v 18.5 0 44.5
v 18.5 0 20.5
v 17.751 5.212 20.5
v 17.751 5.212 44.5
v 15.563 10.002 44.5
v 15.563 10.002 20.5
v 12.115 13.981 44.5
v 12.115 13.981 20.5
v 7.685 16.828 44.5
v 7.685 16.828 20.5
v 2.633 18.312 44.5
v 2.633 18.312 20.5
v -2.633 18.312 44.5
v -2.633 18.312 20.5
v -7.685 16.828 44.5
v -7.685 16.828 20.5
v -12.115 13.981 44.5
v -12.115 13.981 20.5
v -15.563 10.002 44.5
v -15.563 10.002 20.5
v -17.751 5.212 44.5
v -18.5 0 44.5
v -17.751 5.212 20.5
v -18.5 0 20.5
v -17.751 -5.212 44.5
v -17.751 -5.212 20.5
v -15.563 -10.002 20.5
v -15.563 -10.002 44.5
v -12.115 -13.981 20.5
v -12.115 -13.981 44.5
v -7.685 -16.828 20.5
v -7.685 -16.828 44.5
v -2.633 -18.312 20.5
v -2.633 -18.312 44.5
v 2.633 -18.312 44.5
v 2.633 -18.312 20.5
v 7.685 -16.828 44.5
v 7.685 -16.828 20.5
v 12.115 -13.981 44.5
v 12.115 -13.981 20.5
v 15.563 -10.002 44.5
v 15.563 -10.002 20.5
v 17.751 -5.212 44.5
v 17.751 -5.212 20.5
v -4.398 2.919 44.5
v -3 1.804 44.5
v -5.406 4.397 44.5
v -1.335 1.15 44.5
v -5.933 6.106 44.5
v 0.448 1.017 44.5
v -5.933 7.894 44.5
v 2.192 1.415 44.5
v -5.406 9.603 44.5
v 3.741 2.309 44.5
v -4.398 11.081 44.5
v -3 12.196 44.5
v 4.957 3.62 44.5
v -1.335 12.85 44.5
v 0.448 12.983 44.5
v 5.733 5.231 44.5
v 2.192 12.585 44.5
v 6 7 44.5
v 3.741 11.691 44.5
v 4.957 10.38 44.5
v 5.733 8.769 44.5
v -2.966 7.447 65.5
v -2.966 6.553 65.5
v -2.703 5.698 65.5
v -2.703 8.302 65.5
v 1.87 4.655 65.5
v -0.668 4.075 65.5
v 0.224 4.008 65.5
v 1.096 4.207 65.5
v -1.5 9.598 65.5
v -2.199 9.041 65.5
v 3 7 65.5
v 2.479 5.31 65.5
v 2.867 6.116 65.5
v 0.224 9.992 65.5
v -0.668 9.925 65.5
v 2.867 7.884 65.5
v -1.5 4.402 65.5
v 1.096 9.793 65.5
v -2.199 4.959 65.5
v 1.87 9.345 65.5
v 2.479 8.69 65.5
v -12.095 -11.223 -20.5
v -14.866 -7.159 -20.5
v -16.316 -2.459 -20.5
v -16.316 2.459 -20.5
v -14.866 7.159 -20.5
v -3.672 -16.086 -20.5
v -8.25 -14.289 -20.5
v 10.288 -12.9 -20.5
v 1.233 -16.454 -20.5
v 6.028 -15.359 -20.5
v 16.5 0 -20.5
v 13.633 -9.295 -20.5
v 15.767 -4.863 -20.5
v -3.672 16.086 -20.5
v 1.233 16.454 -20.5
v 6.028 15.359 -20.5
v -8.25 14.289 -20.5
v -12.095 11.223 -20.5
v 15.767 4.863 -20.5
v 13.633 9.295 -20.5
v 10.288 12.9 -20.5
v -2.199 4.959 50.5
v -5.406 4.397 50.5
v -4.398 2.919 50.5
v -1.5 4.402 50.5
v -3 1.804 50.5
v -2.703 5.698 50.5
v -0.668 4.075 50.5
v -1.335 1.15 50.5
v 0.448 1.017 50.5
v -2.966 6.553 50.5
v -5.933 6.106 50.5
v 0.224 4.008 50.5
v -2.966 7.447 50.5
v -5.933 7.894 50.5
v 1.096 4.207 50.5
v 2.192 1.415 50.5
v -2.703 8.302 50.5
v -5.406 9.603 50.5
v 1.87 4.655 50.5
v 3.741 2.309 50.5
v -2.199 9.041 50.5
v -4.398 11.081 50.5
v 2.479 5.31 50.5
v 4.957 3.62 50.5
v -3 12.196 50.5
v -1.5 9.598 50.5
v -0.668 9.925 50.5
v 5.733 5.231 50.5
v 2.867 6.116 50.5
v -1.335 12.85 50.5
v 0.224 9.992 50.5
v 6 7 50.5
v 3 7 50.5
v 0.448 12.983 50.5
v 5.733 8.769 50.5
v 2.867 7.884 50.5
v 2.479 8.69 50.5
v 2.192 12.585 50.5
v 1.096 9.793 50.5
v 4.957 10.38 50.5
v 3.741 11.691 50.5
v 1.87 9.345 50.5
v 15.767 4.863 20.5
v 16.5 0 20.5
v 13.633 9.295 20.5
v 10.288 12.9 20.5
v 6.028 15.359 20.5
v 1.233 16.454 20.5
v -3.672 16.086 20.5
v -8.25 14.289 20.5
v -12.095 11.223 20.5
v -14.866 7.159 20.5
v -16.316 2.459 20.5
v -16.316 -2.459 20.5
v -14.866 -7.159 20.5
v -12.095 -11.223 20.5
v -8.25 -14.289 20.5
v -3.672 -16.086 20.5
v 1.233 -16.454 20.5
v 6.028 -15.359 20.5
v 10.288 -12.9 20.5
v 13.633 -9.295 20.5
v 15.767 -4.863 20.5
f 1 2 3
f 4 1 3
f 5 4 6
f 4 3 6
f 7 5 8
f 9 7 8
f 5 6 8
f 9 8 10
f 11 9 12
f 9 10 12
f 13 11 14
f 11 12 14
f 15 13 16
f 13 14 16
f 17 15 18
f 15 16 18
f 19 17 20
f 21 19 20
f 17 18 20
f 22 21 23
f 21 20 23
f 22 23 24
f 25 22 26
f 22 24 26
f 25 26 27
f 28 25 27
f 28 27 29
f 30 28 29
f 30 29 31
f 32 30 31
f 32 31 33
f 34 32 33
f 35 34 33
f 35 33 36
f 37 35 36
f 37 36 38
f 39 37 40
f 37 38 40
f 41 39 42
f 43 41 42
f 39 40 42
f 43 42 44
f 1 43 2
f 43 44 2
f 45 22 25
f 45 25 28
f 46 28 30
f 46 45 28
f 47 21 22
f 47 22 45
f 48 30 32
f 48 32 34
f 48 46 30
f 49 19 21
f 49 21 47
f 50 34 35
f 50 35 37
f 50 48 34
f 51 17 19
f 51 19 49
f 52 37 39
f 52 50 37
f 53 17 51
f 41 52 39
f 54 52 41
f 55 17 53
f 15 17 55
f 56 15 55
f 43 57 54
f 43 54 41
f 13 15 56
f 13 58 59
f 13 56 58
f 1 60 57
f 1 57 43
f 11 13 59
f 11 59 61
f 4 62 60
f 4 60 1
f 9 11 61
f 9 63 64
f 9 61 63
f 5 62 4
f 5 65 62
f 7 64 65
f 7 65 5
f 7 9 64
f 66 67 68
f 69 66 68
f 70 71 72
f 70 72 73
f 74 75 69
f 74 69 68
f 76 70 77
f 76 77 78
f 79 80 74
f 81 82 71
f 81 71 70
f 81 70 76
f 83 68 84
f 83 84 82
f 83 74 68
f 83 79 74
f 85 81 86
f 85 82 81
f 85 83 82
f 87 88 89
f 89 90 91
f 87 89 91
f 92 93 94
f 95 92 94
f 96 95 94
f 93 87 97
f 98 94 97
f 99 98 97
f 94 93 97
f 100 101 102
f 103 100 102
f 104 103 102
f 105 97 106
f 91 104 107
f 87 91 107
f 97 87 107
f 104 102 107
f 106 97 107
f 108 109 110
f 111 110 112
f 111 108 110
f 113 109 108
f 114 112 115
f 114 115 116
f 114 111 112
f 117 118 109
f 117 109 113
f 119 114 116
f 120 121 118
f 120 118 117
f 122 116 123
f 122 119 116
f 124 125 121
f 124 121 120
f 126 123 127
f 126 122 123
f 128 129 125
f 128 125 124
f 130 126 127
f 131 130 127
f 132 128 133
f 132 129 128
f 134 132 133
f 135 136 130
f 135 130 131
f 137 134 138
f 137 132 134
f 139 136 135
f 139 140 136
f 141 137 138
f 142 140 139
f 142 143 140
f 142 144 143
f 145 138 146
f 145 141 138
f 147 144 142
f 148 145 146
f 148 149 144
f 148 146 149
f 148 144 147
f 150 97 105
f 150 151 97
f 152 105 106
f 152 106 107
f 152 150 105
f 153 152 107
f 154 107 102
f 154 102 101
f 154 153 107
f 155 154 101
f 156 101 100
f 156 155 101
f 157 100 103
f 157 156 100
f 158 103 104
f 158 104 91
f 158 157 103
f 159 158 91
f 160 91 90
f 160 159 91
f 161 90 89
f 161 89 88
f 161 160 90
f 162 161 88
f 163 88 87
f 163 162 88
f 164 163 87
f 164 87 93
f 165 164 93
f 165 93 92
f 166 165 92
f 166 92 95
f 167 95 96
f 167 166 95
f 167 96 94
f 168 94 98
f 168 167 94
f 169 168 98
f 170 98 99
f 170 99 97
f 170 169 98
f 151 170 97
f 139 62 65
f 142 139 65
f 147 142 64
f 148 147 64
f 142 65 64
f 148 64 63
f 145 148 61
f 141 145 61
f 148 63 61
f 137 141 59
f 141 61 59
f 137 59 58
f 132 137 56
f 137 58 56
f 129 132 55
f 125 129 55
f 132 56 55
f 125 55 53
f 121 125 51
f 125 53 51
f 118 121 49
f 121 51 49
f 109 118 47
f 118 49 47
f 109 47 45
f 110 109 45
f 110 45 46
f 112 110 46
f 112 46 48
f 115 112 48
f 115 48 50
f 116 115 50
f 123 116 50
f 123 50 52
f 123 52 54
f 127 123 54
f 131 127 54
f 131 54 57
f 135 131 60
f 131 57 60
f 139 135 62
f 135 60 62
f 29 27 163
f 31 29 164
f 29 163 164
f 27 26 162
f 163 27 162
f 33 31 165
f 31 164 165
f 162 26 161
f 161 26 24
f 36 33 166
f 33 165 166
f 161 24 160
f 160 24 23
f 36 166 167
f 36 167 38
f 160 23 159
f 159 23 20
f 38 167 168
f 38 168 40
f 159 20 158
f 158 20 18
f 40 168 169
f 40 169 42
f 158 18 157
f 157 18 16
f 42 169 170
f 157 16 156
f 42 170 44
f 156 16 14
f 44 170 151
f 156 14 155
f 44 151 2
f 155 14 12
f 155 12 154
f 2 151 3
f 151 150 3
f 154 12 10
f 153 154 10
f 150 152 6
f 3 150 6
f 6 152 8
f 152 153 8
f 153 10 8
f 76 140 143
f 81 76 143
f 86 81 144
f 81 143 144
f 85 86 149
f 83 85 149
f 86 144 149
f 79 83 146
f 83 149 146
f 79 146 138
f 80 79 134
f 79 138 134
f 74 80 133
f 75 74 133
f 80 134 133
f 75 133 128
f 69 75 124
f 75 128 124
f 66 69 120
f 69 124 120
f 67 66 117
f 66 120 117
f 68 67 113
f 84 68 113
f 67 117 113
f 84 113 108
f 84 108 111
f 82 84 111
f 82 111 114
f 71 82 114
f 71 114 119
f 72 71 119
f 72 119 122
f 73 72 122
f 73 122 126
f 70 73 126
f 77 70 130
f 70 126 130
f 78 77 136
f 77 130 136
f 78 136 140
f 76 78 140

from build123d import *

# Parameters (mm, degrees)
SKETCH1_R           = 16.5
BOSS_EXTRUDE1_DEPTH = 20.5
SKETCH2_R           = 18.5
BOSS_EXTRUDE2_DEPTH = 24
SKETCH3_R           = 6
BOSS_EXTRUDE3_DEPTH = 6
SKETCH4_R           = 3
BOSS_EXTRUDE4_DEPTH = 15


with BuildPart() as part:
    # Sketch1 → Boss-Extrude1 (new body, symmetric)
    with BuildSketch(Plane.XY):
        Circle(SKETCH1_R)
    extrude(amount=BOSS_EXTRUDE1_DEPTH, both=True)

    # Sketch2 → Boss-Extrude2 (add)
    with BuildSketch(Plane.XY.offset(20.5)):
        Circle(SKETCH2_R)
    extrude(amount=BOSS_EXTRUDE2_DEPTH)

    # Sketch3 → Boss-Extrude3 (add)
    with BuildSketch(Plane.XY.offset(44.5)):
        with Locations((0, 7)):
            Circle(SKETCH3_R)
    extrude(amount=BOSS_EXTRUDE3_DEPTH)

    # Sketch4 → Boss-Extrude4 (add)
    with BuildSketch(Plane.XY.offset(50.5)):
        with Locations((0, 7)):
            Circle(SKETCH4_R)
    extrude(amount=BOSS_EXTRUDE4_DEPTH)


solid = part.part
